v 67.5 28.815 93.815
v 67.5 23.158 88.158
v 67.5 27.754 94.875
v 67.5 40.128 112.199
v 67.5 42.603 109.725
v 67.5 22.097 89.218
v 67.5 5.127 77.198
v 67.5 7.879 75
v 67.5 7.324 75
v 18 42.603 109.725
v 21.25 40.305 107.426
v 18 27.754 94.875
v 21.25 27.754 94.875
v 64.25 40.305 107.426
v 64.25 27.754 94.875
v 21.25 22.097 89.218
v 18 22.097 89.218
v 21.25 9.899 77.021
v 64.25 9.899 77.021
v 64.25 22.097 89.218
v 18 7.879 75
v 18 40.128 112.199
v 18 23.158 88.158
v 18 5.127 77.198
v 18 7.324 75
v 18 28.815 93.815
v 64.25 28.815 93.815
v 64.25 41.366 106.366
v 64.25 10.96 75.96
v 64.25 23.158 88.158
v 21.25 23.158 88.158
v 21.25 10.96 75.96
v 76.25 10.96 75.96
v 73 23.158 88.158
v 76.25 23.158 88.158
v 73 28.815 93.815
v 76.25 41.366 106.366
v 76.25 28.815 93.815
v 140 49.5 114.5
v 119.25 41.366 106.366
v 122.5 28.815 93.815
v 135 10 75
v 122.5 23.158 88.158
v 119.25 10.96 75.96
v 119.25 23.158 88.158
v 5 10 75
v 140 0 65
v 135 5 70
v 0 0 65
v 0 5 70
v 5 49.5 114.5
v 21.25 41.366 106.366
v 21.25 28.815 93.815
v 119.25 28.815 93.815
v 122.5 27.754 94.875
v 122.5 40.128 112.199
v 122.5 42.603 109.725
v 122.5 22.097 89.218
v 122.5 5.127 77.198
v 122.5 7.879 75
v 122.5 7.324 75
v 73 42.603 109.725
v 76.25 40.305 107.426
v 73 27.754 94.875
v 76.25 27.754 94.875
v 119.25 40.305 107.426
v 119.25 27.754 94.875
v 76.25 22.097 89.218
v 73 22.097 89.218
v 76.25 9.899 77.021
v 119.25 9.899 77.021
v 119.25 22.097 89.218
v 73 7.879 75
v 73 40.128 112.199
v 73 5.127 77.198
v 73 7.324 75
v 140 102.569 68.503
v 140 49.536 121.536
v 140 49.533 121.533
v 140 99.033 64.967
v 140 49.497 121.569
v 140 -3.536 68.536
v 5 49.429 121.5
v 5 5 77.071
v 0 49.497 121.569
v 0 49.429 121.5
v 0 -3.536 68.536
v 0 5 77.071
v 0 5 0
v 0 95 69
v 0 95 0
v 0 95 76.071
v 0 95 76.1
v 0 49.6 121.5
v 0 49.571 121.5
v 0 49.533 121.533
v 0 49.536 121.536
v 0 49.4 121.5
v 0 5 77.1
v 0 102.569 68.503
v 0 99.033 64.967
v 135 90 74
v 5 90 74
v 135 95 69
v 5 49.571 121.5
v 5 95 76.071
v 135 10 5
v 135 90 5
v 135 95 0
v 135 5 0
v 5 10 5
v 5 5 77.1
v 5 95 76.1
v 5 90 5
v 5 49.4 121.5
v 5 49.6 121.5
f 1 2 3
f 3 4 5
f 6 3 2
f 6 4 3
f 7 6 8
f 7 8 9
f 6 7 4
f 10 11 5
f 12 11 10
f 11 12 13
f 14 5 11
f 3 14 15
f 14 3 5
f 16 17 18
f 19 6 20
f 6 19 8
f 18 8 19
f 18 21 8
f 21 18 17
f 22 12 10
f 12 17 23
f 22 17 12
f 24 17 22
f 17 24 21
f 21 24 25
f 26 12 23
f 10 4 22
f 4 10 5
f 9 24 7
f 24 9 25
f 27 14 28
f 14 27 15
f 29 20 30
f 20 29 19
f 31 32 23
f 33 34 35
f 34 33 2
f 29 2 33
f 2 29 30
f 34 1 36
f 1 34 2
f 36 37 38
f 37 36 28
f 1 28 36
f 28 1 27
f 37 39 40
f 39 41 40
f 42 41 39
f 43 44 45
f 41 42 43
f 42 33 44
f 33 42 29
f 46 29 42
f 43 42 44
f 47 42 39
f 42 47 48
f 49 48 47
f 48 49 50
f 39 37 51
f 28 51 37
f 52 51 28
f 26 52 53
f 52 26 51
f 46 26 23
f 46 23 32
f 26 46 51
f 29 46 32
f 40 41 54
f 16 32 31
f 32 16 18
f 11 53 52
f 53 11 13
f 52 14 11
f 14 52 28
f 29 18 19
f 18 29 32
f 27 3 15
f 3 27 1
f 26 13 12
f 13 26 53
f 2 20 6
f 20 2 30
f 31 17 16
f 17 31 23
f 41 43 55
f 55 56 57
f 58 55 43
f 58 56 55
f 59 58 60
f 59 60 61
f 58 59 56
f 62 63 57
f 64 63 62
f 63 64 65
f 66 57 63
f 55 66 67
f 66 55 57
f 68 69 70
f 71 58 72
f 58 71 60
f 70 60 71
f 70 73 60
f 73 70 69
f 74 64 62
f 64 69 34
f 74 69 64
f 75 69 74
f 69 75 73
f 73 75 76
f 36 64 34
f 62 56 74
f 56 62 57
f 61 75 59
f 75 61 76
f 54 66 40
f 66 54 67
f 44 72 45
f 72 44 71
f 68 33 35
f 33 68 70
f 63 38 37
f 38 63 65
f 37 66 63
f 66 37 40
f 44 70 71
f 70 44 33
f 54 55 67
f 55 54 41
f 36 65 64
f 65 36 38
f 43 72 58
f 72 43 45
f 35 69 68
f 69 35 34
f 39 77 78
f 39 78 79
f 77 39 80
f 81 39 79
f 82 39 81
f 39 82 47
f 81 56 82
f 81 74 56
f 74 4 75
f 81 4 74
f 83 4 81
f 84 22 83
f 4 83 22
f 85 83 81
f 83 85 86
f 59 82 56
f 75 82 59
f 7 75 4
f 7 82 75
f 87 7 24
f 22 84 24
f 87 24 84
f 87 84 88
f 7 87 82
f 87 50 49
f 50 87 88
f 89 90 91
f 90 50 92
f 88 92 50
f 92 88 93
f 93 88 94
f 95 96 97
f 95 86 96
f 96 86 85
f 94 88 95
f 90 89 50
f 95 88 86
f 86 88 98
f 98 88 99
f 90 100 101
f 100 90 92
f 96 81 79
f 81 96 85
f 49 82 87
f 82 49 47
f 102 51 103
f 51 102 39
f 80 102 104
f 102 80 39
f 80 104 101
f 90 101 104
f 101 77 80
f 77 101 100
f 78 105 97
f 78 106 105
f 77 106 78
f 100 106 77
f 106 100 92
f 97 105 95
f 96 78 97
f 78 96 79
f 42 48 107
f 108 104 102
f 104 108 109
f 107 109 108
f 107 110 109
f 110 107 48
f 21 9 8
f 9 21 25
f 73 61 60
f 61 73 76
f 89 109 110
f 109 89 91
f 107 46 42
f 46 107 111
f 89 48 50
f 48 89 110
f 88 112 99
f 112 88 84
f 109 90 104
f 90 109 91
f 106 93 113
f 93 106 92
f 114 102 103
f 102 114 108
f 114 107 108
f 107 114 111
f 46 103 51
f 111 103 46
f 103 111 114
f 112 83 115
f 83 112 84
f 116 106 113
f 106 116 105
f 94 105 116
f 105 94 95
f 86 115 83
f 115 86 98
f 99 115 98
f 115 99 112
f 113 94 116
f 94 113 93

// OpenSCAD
// file: SolarRoof.scad
module solarPanel()
{
    translate([0,0,1.5]) color("blue") cube([49.5,49.5,4]);
    translate([3.25,3.25,0]) color("red") cube([43,43,5]);
    translate([0,20.5,0]) color("orange") cube([49.5,8,5]);
}

module roof()
{
rotate([45,0,0]) difference()
{
    cube([140,75,5]);
    translate([18,12.25,0]) solarPanel();
    translate([73,12.25,0]) solarPanel();
};

translate([0,46,53]) rotate([-45,0,0]) cube([140,75,5]);
}
// main file
include <SolarRoof.scad>

difference()
{
union()
{
translate([0,0,65]) roof();
translate([0,5,0]) cube([135,5,75]);
translate([0,90,0]) cube([135,5,75]);
translate([0,5,0]) cube([135,85,5]);
translate([0,5,0]) cube([5,90,121.5]);
}

color("blue") translate([0,0,72.1]) rotate([45,0,0]) cube([135,100,35]);
color("blue") translate([0,36,135.1]) rotate([-45,0,0]) cube([135,100,35]);
}
